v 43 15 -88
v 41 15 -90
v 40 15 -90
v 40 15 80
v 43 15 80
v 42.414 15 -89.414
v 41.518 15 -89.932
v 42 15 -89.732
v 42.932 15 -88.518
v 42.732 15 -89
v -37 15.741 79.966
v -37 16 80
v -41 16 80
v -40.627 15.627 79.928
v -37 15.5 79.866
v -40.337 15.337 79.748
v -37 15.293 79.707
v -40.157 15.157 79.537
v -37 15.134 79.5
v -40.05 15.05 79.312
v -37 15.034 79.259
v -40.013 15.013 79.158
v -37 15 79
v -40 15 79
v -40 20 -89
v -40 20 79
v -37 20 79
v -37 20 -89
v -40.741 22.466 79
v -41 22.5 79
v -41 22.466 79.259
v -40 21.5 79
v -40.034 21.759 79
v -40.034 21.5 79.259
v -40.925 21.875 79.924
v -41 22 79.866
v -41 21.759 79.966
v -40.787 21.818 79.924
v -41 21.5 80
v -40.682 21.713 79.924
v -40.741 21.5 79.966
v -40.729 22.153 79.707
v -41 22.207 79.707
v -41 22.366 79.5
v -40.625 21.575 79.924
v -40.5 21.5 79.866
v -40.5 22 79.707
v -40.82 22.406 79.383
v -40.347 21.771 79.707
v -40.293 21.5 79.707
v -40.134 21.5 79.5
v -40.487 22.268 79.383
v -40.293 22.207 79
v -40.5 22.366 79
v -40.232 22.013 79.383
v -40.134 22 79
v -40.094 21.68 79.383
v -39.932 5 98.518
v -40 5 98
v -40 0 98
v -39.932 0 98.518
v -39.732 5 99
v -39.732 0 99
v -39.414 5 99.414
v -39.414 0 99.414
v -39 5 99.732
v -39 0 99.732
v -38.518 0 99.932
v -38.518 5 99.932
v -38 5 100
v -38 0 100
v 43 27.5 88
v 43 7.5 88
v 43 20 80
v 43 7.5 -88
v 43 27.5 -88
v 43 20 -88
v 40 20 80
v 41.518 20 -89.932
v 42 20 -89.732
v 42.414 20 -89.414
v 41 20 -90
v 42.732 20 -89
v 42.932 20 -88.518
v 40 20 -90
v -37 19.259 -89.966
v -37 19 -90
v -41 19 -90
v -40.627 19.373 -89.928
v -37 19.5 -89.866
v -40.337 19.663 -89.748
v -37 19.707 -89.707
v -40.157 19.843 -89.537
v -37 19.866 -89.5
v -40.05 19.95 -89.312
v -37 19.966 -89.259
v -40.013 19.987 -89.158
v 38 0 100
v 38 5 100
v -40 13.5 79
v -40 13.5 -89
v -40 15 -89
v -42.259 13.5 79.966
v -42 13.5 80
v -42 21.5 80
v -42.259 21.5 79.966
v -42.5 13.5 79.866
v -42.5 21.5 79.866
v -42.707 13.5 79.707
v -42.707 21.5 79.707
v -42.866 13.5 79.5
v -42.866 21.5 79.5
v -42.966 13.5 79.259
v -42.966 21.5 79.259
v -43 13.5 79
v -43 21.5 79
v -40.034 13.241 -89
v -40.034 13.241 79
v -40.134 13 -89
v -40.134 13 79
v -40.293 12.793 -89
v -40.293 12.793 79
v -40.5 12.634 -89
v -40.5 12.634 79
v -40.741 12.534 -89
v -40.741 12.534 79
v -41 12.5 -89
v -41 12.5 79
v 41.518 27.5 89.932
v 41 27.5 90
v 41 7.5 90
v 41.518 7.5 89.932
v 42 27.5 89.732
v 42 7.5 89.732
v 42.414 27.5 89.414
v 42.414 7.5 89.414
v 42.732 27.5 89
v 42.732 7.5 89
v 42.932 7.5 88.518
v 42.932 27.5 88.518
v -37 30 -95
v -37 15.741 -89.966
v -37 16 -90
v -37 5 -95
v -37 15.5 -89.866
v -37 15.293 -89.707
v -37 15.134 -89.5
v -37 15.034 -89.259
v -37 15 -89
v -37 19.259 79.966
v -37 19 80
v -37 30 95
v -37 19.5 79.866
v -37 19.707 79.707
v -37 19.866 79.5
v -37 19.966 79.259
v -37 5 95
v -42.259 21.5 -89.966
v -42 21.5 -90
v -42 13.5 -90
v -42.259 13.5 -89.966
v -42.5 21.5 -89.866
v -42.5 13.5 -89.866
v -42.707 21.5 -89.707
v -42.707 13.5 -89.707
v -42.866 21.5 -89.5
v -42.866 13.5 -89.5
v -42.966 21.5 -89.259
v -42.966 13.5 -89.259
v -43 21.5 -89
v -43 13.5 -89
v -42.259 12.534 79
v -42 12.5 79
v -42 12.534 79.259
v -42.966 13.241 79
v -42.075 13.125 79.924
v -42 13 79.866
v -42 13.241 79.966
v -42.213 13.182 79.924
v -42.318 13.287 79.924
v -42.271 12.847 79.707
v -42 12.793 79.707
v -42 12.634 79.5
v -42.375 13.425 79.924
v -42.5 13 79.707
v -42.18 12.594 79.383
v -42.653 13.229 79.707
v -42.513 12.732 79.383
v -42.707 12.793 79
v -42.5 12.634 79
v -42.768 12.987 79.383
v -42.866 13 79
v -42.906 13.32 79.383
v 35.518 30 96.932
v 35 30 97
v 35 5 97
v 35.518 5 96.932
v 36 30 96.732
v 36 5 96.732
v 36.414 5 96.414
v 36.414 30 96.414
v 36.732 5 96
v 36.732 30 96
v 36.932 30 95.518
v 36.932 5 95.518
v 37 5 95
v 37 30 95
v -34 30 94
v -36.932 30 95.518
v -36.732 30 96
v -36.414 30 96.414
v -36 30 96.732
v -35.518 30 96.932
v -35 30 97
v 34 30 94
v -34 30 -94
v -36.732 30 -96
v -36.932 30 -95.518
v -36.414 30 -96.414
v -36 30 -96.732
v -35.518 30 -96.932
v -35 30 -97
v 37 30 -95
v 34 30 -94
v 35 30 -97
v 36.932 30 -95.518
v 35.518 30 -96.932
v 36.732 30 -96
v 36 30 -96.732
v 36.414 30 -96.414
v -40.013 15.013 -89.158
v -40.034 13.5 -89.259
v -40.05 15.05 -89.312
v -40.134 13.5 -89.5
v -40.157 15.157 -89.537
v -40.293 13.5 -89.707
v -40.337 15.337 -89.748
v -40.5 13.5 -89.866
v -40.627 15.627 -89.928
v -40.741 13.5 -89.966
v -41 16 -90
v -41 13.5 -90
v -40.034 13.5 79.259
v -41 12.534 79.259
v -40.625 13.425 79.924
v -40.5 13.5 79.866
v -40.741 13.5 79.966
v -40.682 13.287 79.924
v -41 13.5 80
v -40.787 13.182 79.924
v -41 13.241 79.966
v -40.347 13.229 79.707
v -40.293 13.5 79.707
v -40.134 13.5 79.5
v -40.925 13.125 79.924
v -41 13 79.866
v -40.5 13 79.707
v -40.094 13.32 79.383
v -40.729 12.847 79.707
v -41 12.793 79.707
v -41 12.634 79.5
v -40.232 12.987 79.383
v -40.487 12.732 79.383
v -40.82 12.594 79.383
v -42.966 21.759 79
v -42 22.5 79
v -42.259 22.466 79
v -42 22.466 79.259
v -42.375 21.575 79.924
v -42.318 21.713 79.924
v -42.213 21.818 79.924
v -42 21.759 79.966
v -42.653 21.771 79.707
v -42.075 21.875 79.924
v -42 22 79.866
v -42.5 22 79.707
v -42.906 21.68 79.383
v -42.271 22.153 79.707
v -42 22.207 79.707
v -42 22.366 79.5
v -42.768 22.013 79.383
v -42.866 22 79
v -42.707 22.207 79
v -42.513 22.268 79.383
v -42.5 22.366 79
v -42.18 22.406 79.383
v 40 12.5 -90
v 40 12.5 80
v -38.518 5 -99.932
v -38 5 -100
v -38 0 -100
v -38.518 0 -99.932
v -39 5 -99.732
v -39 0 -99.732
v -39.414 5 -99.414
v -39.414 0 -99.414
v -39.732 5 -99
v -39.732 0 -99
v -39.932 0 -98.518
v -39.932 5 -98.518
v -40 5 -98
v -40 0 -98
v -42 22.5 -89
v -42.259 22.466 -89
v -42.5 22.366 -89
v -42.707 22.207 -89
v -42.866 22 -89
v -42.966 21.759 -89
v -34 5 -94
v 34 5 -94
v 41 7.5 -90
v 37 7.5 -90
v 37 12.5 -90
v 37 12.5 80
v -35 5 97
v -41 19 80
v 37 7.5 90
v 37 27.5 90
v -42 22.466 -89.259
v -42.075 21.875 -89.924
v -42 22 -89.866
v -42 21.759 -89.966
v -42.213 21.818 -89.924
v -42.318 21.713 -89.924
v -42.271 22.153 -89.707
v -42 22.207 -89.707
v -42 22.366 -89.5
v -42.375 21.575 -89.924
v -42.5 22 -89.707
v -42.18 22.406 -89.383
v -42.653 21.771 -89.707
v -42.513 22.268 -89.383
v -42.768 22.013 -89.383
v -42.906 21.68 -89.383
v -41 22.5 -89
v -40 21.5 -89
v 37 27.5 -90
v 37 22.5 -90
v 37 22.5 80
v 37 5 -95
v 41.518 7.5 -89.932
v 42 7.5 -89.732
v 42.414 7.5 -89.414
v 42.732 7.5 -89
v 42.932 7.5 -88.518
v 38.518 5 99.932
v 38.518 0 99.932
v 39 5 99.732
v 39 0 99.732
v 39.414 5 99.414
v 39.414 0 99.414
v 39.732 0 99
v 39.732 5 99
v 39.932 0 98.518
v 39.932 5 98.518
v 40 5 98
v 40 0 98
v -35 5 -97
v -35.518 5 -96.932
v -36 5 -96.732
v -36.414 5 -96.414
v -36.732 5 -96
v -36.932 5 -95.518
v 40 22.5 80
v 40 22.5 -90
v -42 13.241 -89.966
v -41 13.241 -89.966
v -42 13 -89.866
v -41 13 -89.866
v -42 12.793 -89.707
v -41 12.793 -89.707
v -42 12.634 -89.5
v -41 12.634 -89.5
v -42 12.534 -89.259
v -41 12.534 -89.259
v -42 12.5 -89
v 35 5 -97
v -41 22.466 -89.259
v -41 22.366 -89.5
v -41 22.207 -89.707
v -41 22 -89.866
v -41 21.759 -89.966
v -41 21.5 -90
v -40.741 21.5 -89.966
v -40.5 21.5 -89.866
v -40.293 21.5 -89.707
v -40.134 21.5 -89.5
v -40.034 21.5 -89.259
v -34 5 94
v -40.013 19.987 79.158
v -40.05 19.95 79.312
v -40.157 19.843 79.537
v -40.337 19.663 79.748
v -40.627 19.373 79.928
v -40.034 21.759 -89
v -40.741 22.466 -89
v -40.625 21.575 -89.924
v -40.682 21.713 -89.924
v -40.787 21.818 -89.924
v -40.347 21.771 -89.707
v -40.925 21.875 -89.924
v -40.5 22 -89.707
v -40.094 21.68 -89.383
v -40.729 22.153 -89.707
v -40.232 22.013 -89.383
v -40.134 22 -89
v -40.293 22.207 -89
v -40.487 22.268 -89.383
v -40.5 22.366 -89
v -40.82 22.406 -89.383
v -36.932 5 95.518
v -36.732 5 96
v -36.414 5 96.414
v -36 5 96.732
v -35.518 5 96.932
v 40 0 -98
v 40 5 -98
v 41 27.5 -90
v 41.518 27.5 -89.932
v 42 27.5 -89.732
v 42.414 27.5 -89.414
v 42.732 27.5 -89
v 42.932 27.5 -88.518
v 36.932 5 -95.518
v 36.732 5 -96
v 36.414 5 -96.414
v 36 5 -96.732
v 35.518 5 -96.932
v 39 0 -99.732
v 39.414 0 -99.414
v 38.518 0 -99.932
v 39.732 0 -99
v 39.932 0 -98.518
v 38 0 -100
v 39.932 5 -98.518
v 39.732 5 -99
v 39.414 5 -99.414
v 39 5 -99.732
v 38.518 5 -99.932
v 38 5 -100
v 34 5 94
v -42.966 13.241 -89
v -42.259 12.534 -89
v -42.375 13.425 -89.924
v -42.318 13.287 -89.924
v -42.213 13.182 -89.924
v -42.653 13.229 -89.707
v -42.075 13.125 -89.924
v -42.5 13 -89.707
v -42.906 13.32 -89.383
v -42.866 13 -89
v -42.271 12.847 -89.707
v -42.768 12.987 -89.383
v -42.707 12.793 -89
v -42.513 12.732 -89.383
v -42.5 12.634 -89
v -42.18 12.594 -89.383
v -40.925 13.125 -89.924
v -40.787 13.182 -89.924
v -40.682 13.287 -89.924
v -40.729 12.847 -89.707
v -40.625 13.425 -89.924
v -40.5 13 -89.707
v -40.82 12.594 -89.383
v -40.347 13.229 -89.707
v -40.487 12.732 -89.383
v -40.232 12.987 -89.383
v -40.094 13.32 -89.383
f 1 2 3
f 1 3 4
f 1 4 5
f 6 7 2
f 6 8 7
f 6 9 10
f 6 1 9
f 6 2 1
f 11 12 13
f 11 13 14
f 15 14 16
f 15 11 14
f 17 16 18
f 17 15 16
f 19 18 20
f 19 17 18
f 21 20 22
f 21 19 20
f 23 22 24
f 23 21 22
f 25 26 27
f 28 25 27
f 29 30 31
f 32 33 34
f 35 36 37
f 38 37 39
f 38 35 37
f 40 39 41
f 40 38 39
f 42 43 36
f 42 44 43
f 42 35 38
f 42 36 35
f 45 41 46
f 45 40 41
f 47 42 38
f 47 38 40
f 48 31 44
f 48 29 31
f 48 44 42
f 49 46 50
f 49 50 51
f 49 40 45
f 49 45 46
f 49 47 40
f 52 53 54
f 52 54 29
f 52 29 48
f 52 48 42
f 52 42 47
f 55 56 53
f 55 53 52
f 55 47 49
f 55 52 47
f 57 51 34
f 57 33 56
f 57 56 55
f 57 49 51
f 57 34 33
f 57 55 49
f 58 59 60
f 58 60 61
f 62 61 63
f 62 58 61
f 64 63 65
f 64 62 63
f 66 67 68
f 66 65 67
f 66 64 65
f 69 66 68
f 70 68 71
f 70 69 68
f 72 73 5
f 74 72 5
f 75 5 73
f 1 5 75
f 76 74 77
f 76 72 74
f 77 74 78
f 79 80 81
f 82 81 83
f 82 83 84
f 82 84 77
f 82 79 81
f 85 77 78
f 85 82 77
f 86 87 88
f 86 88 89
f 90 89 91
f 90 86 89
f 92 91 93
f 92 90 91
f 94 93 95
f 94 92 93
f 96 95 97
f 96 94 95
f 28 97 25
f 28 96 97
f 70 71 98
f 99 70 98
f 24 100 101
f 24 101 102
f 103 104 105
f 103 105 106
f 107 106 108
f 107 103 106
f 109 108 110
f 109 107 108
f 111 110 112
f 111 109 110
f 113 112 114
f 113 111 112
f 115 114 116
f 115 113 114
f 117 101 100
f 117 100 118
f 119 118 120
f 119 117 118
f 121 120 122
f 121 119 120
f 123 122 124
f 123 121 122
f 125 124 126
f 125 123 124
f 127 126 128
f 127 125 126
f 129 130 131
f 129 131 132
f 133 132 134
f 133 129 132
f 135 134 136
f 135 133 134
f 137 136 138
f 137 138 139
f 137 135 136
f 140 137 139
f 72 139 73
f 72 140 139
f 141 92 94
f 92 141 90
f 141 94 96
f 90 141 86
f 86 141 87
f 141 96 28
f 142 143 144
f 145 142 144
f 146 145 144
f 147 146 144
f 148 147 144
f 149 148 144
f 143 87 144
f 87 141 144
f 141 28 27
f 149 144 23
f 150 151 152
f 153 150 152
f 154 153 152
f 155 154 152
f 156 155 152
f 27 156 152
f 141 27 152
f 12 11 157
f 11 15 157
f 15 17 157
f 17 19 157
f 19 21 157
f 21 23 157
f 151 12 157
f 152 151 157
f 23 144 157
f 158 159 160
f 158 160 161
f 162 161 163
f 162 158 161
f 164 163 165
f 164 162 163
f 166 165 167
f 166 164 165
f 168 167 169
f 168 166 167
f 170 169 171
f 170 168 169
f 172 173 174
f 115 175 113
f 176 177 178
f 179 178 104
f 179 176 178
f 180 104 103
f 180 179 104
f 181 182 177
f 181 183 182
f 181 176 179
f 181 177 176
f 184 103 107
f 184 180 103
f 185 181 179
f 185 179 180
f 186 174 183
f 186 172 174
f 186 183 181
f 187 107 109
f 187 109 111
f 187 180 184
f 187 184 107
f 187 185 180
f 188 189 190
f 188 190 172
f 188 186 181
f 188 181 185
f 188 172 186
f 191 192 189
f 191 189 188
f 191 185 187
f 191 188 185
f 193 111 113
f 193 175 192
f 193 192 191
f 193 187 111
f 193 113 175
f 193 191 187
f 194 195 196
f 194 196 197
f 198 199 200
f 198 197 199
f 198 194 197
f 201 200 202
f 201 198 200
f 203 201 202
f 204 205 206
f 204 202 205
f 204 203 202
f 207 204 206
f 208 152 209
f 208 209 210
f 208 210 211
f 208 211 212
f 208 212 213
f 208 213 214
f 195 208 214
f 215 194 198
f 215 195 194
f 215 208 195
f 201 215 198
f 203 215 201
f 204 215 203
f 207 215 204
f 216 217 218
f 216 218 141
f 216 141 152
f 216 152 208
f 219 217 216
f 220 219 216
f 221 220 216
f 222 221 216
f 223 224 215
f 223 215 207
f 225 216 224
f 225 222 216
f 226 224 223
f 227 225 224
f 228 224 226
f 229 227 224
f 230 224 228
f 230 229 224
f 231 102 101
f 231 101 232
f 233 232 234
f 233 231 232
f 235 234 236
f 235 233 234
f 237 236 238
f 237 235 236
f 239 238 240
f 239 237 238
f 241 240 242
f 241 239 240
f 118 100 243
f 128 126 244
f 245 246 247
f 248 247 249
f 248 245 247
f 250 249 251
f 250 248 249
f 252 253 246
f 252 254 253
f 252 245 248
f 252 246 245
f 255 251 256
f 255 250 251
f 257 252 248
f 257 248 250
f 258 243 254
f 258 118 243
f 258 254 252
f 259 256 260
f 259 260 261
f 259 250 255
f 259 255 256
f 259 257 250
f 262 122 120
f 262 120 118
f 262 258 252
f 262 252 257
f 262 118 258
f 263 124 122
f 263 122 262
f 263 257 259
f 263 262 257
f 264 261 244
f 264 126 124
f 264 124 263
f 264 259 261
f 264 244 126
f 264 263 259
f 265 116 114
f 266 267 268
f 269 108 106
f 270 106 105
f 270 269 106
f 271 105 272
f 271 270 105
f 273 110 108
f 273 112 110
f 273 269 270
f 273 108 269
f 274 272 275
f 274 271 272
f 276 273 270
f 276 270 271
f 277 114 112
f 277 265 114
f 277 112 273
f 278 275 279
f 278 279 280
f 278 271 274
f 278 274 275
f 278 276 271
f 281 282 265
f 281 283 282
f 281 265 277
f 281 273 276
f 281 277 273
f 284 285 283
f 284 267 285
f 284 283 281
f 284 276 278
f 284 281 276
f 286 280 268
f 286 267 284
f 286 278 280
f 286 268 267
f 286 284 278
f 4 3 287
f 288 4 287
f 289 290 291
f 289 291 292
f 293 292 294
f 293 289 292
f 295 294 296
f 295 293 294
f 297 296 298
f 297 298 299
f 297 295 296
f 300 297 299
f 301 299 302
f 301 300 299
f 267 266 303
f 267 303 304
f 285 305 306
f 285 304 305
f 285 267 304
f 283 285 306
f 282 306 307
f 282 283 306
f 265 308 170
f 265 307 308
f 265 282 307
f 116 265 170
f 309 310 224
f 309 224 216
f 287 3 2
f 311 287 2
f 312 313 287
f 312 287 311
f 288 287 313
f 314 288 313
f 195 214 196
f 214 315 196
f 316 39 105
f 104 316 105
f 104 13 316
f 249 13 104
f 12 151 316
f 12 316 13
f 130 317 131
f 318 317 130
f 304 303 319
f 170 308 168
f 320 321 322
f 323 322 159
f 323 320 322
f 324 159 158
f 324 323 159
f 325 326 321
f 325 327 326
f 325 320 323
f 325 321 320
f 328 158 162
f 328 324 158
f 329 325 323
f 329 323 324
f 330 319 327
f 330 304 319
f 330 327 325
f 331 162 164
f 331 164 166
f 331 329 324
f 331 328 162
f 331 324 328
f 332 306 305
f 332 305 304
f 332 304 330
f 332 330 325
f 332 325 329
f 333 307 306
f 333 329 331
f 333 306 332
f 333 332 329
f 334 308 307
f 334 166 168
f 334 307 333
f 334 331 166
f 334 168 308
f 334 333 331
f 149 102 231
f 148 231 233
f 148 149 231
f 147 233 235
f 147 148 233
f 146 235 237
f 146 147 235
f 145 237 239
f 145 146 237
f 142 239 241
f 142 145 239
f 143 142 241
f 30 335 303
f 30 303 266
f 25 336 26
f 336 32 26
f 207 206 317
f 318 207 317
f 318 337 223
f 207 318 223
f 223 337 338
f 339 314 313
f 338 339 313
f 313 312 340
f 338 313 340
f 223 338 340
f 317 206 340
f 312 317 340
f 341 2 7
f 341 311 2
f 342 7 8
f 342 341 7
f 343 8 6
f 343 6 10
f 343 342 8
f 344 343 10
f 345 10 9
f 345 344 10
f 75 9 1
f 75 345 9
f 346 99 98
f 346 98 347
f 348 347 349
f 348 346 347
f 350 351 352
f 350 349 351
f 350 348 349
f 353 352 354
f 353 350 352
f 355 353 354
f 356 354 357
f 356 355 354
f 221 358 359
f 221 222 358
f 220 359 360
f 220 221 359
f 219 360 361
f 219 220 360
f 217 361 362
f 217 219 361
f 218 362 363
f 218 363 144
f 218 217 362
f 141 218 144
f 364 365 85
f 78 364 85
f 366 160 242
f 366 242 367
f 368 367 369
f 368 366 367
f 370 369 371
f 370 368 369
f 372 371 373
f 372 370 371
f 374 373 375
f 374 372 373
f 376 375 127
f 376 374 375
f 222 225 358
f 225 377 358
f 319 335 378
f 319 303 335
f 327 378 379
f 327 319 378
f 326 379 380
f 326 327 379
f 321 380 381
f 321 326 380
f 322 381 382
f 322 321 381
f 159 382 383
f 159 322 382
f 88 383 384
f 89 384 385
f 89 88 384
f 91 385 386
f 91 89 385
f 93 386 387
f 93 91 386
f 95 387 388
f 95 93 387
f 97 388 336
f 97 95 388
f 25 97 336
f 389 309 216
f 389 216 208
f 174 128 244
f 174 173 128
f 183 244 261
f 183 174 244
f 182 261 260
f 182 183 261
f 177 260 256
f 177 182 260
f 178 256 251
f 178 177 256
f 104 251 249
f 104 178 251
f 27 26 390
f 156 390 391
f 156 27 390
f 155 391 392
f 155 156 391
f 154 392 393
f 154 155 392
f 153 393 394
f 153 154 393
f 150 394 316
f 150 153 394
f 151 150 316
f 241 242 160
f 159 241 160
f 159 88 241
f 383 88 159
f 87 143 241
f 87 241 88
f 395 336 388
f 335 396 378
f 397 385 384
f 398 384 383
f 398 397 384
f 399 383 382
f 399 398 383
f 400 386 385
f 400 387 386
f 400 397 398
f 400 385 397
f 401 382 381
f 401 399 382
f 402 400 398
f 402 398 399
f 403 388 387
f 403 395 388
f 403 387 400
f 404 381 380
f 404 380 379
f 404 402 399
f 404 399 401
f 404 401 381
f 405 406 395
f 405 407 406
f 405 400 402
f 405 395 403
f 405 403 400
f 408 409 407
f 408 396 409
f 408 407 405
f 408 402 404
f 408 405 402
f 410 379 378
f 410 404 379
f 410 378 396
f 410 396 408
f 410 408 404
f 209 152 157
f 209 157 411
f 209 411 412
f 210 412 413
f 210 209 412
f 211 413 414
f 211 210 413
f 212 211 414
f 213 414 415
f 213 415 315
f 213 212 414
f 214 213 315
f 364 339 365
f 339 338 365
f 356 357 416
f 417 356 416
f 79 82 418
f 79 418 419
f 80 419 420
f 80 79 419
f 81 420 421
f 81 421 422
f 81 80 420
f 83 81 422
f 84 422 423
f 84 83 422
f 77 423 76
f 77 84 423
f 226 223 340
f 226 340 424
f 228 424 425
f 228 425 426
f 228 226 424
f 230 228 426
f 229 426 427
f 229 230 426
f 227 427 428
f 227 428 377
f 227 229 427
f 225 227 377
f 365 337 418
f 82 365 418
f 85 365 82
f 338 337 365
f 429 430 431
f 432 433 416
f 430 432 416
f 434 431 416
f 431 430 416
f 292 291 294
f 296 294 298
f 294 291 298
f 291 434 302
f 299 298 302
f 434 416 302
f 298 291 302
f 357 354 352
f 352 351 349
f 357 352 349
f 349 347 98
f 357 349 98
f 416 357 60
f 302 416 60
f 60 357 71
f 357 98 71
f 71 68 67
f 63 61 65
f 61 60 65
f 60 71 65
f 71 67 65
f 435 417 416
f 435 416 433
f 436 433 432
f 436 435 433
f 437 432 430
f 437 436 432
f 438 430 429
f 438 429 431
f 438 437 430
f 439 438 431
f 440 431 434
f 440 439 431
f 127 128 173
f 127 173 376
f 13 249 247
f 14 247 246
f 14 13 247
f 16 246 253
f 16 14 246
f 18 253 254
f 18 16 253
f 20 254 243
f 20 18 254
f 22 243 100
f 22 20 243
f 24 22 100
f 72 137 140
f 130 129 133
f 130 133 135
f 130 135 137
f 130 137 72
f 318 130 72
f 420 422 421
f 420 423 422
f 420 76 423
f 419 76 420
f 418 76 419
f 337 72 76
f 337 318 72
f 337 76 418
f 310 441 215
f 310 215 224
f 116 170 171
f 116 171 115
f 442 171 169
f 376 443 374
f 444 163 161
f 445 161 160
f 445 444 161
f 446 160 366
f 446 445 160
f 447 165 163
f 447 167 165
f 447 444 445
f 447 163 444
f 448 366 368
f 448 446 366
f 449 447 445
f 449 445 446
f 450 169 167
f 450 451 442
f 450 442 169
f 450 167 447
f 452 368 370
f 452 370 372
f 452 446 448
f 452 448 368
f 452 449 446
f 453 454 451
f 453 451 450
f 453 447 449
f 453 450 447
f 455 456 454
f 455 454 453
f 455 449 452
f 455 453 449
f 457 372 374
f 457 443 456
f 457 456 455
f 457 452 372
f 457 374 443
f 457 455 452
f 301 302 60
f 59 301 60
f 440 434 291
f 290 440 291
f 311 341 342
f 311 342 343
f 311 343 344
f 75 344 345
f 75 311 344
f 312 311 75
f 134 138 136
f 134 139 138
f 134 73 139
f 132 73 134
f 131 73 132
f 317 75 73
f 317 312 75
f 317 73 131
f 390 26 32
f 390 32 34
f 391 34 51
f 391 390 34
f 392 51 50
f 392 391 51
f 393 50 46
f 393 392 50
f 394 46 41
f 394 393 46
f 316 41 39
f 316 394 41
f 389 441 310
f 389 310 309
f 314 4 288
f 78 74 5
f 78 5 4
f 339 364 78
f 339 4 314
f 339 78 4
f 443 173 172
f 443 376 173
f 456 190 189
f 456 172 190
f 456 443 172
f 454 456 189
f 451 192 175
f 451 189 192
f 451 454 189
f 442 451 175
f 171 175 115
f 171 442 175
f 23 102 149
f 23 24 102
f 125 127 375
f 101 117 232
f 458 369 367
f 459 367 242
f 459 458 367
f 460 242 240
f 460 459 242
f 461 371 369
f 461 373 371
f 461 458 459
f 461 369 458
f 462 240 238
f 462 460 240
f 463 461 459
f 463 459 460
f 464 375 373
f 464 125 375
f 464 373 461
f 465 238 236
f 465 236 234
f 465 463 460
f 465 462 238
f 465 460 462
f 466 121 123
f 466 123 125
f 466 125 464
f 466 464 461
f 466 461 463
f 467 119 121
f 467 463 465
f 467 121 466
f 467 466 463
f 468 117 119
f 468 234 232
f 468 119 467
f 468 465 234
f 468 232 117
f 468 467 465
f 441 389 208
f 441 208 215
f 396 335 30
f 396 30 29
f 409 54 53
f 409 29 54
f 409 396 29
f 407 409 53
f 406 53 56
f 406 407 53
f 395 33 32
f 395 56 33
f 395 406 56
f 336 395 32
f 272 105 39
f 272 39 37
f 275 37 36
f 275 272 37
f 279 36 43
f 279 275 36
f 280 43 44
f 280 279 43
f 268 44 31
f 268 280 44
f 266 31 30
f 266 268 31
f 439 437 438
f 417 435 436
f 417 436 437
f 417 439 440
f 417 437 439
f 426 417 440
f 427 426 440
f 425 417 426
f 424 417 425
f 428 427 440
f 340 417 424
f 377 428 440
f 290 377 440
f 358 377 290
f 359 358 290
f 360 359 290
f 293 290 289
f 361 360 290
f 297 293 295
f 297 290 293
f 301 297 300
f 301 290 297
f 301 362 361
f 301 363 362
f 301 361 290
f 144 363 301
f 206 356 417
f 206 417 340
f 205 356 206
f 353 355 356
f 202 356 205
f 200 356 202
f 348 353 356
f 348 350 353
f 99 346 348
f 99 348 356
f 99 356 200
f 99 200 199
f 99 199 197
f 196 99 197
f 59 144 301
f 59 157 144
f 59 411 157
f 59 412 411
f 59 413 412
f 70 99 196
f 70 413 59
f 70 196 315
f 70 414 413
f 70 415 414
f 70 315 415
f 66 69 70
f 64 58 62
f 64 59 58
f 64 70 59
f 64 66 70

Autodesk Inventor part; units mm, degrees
ref_plane "YZ Plane" through (0, 0, 0) normal (1, 0, 0) x (0, 1, 0)
ref_plane "XZ Plane" through (0, 0, 0) normal (0, 1, 0) x (-1, 0, 0)
ref_plane "XY Plane" through (0, 0, 0) normal (0, 0, 1) x (1, 0, 0)
sketch "Sketch1" plane through (0, 0, 0) normal (0, 1, 0) x (-1, 0, 0)
  line L0 (-40, -100) -> (40, -100)
  line L1 (40, -100) -> (40, 100)
  line L2 (40, 100) -> (-40, 100)
  line L3 (-40, 100) -> (-40, -100)
  line L4 (-40, -100) -> (40, 100) construction
  line L5 (40, -100) -> (-40, 100) construction
  point P0 (0, 0)
  dimension "d0" = 80
  dimension "d1" = 200
extrude "Extrusion1" add sketch "Sketch1" along normal blind 5
sketch "Sketch2" plane through (0, 5, 0) normal (0, 1, 0) x (1, 0, 0)
  line L0 (-40, 100) -> (-40, -100) projected
  line L1 (-40, -100) -> (40, -100) projected
  line L2 (40, -100) -> (40, 100) projected
  line L3 (40, 100) -> (-40, 100) projected
  line L4 (37, 97) -> (-37, 97)
  line L5 (-37, 97) -> (-37, -97)
  line L6 (-37, -97) -> (37, -97)
  line L7 (37, -97) -> (37, 97)
  line L8 (37, 97) -> (-37, -97) construction
  line L9 (-37, 97) -> (37, -97) construction
  line L10 (34, 94) -> (-34, 94)
  line L11 (-34, 94) -> (-34, -94)
  line L12 (-34, -94) -> (34, -94)
  line L13 (34, -94) -> (34, 94)
  line L14 (34, 94) -> (-34, -94) construction
  line L15 (-34, 94) -> (34, -94) construction
  point P0 (0, 0)
  dimension "d4" = 3
  dimension "d5" = 3
  dimension "d6" = 3
  dimension "d7" = 3
extrude "Extrusion2" add sketch "Sketch2" along normal blind 25 contours L7 L6 L5 L4
fillet "Fillet1" radius 2 4 edges at (-37, 17.5, 97) (37, 17.5, 97) (37, 17.5, -97) (-37, 17.5, -97)
fillet "Fillet2" radius 2 4 edges at (-40, 2.5, 100) (40, 2.5, 100) (40, 2.5, -100) (-40, 2.5, -100)
sketch "Sketch3" plane through (37, 5, 95) normal (1, 0, 0) x (0, 0, -1)
  line L0 (190, 25) -> (190, 0) projected
  line L1 (0, 25) -> (190, 25) projected
  line L2 (0, 0) -> (0, 25) projected
  line L3 (190, 0) -> (0, 0) projected
  line L4 (5, 22.5) -> (185, 22.5)
  line L5 (185, 22.5) -> (185, 2.5)
  line L6 (185, 2.5) -> (5, 2.5)
  line L7 (5, 2.5) -> (5, 22.5)
  line L8 (-2, 25) -> (-2, 0) projected
  line L9 (192, 0) -> (192, 25) projected
  line L10 (195, -5) -> (195, 0) projected
  line L11 (-5, 0) -> (-5, -5) projected
  point P0 (95, -5)
  point P1 (185, 12.5)
  point P2 (-2, 12.5)
  dimension "d33" = 20
  dimension "d34" = 10
  dimension "d35" = 10
  dimension "d36" = 10
extrude "Extrusion3" add sketch "Sketch3" along normal blind 6 contours L4 L5 L6 L7
sketch "Sketch4" plane through (37, 7.5, -90) normal (0, 0, -1) x (-1, 0, 0)
  line L0 (0, 20) -> (0, 0) projected
  line L1 (0, 20) -> (-6, 20) projected
  line L2 (-6, 0) -> (-6, 20) projected
  line L3 (0, 0) -> (-6, 0) projected
  line L4 (-6, 0) -> (-6, 20) projected
  line L5 (-6, 12.5) -> (-3, 12.5)
  line L6 (-3, 12.5) -> (-3, 7.5)
  line L7 (-3, 7.5) -> (-6, 7.5)
  line L8 (-6, 7.5) -> (-6, 12.5)
  line L9 (0, -2.5) -> (0, 22.5) projected
  line L10 (0, 15) -> (-3, 15)
  line L11 (-3, 15) -> (-3, 5)
  line L12 (-3, 5) -> (0, 5)
  line L13 (0, 5) -> (0, 15)
  point P0 (37, -7.5)
  point P1 (-4.5, 12.5)
  point P2 (-6, 7.5)
  point P3 (-3, 7.5)
  point P4 (0, 5)
  point P5 (-3, 12.5)
  point P6 (-1.5, 5)
  dimension "d19" = 3
  dimension "d22" = 5
  dimension "d23" = 5
  dimension "d37" = 2.5
  dimension "d38" = 2.5
extrude "Extrusion4" cut sketch "Sketch4" against normal blind 170 contours L0 L12 L11 L6 L10 | L5 L6 L7 L2
fillet "Fillet3" radius 2 3 edges at (43, 17.5, 90) (43, 11.25, -90) (43, 23.75, -90)
sketch "Sketch5" plane through (-37, 5, -95) normal (-1, 0, 0) x (0, 0, 1)
  line L0 (0, 25) -> (190, 25) projected
  line L1 (-2, 25) -> (-2, 0) projected
  line L2 (192, 0) -> (192, 25) projected
  line L3 (5, 17.5) -> (175, 17.5)
  line L4 (175, 17.5) -> (175, 7.5)
  line L5 (175, 7.5) -> (5, 7.5)
  line L6 (5, 7.5) -> (5, 17.5)
  line L7 (-5, 0) -> (-5, -5) projected
  line L8 (195, -5) -> (195, 0) projected
  point P0 (95, -5)
  point P1 (192, 12.5)
  dimension "d28" = 10
  dimension "d39" = 10
  dimension "d40" = 20
  dimension "d41" = 5
extrude "Extrusion5" add sketch "Sketch5" along normal blind 6
sketch "Sketch6" plane through (-37, 12.5, 80) normal (0, 0, 1) x (1, 0, 0)
  line L0 (0, 10) -> (0, 0) projected
  line L1 (0, 10) -> (-6, 10) projected
  line L2 (-6, 0) -> (-6, 10) projected
  line L3 (0, 0) -> (-6, 0) projected
  line L4 (0, 10) -> (-3, 10)
  line L5 (-3, 10) -> (-3, 7.5)
  line L6 (-3, 7.5) -> (0, 7.5)
  line L7 (0, 7.5) -> (0, 10)
  line L8 (0, 0) -> (-3, 0)
  line L9 (-3, 0) -> (-3, 2.5)
  line L10 (-3, 2.5) -> (0, 2.5)
  line L11 (0, 2.5) -> (0, 0)
  point P0 (37, -12.5)
  point P1 (0, 2.5)
  point P2 (-3, 0)
  point P3 (0, 7.5)
  point P4 (-3, 10)
  dimension "d44" = 3
  dimension "d45" = 2.5
  dimension "d46" = 3
  dimension "d47" = 2.5
extrude "Extrusion6" cut sketch "Sketch6" against normal up to surface (170 mm away) contours L0 L6 L5 L1 | L0 L3 L9 L10
fillet "Fillet4" radius 1 18 edges at (-43, 22.5, -5) (-40, 22.5, -5) (-43, 12.5, -5) (-40, 12.5, -5) (-43, 17.5, 80) (-40, 21.25, 80) (-41.5, 22.5, 80) (-41.5, 12.5, 80) (-40, 13.75, 80) (-40, 13.75, -90) (-43, 17.5, -90) (-40, 21.25, -90) (-41.5, 22.5, -90) (-41.5, 12.5, -90) (-38.5, 20, -90) (-38.5, 15, -90) (-38.5, 15, 80) (-38.5, 20, 80)
properties part number "module_command"
